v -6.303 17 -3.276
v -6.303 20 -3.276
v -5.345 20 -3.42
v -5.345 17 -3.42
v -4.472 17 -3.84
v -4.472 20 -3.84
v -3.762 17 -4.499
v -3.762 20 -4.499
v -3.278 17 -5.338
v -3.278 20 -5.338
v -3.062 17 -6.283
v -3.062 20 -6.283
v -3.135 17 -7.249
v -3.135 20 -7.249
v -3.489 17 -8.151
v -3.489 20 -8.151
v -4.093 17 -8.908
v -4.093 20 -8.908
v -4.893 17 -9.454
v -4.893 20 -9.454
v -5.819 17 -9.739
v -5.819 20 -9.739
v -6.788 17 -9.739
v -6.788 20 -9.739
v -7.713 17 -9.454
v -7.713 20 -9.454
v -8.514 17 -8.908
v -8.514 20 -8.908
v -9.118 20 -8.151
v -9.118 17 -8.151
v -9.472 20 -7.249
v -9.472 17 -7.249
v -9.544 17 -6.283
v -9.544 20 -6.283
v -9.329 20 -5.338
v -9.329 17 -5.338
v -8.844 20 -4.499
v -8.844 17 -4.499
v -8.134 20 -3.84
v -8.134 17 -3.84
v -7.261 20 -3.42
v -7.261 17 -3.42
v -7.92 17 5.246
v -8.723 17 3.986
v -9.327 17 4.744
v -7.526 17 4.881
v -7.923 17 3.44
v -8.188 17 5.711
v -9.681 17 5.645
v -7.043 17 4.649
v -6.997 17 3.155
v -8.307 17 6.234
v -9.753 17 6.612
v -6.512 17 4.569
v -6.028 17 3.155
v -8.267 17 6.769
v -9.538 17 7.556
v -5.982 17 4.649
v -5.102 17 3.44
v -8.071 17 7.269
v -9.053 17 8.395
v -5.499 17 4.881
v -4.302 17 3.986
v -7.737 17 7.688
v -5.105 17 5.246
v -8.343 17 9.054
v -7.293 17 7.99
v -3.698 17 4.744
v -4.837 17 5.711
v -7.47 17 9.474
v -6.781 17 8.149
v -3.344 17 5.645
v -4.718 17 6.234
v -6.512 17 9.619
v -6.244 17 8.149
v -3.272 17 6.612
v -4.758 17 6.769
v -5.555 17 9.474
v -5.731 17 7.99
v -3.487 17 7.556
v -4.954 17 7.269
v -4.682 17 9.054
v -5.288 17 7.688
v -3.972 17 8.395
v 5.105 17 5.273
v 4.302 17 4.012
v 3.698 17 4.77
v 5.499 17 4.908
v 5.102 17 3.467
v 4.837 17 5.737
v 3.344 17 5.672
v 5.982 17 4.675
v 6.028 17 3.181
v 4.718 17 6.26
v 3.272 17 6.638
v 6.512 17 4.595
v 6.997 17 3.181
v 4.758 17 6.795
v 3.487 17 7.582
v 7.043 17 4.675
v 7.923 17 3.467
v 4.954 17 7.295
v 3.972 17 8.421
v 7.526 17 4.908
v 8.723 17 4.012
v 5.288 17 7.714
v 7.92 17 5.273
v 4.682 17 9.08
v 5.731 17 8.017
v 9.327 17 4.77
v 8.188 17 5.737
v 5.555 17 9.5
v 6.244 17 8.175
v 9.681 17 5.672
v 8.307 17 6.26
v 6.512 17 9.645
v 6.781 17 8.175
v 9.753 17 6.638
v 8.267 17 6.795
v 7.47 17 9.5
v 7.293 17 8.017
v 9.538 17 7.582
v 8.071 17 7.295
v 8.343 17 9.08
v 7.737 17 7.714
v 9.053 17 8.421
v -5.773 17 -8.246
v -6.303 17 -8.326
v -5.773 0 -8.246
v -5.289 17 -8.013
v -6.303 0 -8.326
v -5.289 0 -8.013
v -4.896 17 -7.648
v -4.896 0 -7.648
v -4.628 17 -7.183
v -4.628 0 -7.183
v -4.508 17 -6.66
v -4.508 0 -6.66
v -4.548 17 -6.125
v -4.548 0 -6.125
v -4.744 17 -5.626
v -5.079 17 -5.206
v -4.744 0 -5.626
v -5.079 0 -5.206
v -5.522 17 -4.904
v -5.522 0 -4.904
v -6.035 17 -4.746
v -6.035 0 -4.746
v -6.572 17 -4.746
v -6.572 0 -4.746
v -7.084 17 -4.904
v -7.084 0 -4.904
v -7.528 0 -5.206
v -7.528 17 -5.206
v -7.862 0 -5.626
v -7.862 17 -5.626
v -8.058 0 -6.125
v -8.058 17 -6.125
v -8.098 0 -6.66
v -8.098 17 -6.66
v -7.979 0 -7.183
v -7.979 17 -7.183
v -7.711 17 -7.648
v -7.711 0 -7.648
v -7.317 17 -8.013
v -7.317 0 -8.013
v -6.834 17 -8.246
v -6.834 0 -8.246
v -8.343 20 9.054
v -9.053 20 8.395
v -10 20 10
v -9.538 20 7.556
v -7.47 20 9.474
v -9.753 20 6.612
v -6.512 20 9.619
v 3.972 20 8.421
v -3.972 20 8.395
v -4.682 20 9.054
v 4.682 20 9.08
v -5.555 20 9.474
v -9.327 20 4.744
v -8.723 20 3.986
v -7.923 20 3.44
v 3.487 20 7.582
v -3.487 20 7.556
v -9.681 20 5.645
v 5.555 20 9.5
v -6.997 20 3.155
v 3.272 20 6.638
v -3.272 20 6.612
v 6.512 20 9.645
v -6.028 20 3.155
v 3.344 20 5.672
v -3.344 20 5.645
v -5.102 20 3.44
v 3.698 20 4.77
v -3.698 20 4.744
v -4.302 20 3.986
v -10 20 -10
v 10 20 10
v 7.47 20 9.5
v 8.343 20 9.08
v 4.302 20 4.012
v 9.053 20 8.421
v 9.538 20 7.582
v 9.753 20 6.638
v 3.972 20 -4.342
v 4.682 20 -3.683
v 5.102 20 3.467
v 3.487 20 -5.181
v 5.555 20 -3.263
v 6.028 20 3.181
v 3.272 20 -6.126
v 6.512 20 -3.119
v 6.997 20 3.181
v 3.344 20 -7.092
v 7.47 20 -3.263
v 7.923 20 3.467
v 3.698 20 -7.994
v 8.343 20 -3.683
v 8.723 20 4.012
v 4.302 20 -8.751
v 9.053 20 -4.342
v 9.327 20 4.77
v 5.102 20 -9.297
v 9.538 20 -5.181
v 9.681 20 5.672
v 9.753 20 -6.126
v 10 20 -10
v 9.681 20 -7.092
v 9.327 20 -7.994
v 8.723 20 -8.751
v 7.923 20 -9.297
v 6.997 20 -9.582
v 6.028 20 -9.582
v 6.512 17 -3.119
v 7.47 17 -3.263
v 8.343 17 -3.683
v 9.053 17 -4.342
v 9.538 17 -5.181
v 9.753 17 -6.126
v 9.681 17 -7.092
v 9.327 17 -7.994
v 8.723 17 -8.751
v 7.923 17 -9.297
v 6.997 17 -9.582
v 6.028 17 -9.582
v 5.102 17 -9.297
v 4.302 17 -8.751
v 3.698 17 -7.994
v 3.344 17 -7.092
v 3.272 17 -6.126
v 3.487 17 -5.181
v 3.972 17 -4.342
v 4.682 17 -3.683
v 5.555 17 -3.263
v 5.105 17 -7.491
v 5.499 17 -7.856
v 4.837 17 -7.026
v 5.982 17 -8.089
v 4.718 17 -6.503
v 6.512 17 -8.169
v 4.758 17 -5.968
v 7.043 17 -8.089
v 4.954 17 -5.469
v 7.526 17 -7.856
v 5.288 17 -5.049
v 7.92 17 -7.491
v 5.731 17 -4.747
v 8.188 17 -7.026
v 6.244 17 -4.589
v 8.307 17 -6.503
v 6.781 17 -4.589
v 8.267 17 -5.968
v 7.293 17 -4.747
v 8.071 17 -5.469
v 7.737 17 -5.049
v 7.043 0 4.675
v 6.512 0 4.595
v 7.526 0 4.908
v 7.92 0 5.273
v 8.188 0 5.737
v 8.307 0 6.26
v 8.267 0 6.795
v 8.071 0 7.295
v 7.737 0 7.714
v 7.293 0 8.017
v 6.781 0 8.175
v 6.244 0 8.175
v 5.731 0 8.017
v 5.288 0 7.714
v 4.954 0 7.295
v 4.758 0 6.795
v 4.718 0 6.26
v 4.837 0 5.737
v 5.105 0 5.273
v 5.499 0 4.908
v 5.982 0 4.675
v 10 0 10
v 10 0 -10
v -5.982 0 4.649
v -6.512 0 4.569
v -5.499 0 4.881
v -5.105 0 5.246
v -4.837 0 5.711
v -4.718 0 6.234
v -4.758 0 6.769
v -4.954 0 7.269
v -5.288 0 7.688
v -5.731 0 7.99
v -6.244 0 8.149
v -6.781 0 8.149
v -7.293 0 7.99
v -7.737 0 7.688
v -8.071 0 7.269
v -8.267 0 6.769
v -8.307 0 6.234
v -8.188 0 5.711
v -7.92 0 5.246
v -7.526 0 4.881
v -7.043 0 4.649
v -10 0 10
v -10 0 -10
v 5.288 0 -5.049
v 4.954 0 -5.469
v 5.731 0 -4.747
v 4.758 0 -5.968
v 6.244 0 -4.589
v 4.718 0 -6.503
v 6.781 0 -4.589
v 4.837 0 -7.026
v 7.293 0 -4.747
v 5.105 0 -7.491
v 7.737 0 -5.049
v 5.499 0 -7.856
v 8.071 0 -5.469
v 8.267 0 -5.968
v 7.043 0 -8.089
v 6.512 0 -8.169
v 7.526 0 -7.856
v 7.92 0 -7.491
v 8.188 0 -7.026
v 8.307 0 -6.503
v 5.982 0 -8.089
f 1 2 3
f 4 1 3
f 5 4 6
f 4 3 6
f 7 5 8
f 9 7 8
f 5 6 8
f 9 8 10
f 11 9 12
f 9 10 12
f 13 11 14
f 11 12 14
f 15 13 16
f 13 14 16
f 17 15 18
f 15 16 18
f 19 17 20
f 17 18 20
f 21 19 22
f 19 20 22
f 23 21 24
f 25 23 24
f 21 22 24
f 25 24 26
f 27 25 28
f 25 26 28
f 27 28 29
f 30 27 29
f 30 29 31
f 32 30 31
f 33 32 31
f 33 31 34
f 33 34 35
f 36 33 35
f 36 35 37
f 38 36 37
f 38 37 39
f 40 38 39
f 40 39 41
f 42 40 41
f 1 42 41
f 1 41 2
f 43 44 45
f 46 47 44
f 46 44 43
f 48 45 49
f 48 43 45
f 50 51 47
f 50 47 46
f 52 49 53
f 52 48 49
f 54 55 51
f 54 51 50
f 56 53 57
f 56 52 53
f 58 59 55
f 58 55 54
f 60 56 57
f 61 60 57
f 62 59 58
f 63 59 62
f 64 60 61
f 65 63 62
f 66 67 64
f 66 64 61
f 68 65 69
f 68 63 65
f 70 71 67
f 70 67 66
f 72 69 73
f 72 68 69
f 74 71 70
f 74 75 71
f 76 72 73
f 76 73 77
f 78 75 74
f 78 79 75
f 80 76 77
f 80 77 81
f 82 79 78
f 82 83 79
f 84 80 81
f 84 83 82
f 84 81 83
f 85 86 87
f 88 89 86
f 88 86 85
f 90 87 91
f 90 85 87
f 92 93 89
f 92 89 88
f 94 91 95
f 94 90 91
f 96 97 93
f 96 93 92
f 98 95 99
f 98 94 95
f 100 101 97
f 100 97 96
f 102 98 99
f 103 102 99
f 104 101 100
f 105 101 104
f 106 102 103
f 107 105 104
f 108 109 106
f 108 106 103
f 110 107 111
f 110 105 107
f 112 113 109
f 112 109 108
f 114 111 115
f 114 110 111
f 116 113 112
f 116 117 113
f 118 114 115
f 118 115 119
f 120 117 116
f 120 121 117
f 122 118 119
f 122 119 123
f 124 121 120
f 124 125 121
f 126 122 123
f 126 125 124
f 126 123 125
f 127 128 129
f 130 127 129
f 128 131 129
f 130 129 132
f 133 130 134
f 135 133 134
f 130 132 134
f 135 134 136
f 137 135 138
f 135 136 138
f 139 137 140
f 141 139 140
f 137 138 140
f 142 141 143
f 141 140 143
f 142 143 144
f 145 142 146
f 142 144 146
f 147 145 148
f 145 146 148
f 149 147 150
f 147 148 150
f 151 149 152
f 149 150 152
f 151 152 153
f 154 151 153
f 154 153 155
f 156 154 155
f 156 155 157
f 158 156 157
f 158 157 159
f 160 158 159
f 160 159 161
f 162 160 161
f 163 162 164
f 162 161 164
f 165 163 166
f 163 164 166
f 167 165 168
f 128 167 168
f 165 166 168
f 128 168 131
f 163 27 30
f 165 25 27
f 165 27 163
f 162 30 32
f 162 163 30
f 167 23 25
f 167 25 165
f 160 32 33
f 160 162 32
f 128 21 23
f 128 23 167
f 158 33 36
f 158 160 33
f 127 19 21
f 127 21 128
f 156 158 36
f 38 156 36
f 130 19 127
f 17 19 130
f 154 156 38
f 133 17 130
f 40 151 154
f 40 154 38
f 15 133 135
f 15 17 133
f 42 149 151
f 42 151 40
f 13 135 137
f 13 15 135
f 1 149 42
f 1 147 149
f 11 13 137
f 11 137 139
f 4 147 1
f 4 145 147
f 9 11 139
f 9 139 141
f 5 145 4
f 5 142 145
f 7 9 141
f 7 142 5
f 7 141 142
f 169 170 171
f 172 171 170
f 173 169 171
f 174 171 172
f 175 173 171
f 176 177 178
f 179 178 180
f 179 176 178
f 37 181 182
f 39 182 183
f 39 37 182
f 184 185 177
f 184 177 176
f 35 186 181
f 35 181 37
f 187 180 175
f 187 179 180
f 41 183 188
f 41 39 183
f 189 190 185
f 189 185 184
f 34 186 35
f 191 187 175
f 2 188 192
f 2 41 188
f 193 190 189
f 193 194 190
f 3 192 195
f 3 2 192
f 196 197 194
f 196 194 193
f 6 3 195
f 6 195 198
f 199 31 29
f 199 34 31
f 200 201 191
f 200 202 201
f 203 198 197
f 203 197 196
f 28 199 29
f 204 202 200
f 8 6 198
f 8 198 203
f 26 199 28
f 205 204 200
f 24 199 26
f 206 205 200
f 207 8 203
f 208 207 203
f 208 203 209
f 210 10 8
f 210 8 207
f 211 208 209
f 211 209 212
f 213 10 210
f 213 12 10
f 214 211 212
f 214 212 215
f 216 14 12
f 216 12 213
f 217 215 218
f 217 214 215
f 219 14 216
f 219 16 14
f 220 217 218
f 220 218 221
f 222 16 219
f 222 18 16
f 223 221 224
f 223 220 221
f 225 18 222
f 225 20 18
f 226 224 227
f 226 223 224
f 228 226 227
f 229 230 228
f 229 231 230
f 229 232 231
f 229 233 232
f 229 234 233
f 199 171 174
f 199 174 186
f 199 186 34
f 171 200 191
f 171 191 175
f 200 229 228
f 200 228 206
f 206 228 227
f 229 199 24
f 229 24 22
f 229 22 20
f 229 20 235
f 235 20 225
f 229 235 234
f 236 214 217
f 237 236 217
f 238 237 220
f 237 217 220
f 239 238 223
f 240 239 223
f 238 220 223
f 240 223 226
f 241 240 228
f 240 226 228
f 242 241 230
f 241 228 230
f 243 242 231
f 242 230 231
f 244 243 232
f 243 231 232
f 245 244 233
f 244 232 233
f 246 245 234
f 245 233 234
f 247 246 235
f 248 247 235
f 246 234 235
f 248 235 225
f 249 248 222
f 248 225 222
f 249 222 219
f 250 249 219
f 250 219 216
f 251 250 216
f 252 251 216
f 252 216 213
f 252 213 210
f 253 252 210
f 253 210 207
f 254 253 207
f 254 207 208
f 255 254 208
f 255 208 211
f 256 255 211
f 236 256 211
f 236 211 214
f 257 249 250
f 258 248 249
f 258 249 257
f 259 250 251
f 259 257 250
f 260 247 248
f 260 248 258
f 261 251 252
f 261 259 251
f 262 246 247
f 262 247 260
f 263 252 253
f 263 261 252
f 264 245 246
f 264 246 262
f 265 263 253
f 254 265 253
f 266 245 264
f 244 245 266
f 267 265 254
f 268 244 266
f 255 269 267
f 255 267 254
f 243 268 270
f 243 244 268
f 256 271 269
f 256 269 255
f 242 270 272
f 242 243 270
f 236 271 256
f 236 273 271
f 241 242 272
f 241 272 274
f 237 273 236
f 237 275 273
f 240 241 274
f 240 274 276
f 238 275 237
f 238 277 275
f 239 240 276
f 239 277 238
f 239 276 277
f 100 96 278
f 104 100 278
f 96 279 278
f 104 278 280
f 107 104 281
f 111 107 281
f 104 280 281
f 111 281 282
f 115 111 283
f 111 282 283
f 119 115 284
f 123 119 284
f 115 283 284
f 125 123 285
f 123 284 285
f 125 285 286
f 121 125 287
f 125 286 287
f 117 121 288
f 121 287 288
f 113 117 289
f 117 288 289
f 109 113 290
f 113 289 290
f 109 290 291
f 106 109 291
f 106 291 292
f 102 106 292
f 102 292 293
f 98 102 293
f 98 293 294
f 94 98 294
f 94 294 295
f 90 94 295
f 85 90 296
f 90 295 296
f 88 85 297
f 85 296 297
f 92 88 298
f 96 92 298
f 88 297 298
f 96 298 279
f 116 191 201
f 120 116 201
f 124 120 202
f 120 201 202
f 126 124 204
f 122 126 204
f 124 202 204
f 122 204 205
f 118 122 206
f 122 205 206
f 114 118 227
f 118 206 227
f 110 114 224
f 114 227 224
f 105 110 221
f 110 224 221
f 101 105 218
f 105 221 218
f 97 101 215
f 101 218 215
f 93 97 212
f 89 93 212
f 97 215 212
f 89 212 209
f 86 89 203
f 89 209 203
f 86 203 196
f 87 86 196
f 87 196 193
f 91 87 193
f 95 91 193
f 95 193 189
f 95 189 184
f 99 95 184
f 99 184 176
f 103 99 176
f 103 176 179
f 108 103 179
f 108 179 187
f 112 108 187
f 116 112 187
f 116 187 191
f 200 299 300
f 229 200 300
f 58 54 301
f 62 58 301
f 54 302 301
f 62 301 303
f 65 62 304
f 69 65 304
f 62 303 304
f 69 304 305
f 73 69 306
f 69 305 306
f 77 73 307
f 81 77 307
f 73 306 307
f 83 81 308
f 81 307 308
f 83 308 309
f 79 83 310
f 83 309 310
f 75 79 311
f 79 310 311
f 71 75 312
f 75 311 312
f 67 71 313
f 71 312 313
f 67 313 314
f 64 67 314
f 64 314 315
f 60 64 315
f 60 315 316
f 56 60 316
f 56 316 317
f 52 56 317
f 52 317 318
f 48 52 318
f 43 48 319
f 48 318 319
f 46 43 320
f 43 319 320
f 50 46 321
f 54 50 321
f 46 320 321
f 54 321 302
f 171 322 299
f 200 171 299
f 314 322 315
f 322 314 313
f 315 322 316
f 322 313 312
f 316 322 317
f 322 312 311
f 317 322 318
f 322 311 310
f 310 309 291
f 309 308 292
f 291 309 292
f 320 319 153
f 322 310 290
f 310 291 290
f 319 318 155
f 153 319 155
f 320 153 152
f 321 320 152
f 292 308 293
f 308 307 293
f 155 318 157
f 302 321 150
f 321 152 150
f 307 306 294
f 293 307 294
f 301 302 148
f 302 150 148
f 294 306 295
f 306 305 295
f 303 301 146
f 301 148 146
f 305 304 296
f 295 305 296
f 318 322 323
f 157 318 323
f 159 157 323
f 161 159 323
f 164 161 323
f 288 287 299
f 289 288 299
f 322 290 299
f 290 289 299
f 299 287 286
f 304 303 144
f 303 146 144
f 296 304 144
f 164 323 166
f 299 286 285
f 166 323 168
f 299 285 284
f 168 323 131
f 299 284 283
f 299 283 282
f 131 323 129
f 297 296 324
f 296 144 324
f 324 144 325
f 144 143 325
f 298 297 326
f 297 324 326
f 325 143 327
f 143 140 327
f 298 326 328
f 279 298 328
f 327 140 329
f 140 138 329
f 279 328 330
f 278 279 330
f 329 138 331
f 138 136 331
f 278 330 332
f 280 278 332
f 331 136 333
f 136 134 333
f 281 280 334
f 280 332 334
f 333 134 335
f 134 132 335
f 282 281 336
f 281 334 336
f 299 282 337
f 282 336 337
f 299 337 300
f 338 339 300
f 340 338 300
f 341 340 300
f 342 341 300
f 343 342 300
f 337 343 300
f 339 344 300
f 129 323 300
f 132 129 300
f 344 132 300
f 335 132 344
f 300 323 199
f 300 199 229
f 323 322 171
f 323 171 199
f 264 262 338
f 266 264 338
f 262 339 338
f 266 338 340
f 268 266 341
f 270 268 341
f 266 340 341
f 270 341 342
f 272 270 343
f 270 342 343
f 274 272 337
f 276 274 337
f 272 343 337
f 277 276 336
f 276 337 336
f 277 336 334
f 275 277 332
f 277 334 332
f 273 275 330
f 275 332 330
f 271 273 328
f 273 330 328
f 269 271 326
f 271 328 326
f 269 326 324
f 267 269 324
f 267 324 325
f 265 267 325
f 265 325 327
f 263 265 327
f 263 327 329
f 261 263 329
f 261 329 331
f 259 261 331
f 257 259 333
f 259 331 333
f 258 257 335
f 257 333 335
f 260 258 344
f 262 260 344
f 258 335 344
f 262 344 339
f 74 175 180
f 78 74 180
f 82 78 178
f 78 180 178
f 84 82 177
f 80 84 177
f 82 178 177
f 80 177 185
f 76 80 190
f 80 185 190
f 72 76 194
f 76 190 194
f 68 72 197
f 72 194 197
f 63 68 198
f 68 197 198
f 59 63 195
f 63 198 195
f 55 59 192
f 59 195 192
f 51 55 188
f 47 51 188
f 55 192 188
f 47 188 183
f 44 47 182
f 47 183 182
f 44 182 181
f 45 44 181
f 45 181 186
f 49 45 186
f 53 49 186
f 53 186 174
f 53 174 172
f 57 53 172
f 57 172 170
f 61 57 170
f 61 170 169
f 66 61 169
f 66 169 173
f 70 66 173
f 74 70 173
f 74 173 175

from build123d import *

# Parameters (mm, degrees)
ESBO_O1_W                         = 20
ESBO_O1_H                         = 20
RESSALTO_EXTRUS_O1_DEPTH          = 20
REBAIXO_PARA_SHCS_M32_D           = 3.6
REBAIXO_PARA_SHCS_M32_CBORE_D     = 6.5
REBAIXO_PARA_SHCS_M32_CBORE_DEPTH = 3


with BuildPart() as part:
    # Esboço1 → Ressalto-extrusão1 (new body)
    with BuildSketch(Plane(origin=(0, 0, 0), x_dir=(1, 0, 0), z_dir=(0, 1, 0))):
        Rectangle(ESBO_O1_W, ESBO_O1_H)
    extrude(amount=RESSALTO_EXTRUS_O1_DEPTH)

    # Rebaixo para SHCS M32 (through all)
    with Locations(Plane(origin=(-6.303242204, 20, -6.525555725), x_dir=(0, 0, 1), z_dir=(0, 1, 0))):
        with Locations((0, 0), (0.156927192, 12.815720663), (12.92033879, 12.815720663), (12.894184258, -0.209236255)):
            CounterBoreHole(REBAIXO_PARA_SHCS_M32_D / 2, REBAIXO_PARA_SHCS_M32_CBORE_D / 2, REBAIXO_PARA_SHCS_M32_CBORE_DEPTH)


solid = part.part
